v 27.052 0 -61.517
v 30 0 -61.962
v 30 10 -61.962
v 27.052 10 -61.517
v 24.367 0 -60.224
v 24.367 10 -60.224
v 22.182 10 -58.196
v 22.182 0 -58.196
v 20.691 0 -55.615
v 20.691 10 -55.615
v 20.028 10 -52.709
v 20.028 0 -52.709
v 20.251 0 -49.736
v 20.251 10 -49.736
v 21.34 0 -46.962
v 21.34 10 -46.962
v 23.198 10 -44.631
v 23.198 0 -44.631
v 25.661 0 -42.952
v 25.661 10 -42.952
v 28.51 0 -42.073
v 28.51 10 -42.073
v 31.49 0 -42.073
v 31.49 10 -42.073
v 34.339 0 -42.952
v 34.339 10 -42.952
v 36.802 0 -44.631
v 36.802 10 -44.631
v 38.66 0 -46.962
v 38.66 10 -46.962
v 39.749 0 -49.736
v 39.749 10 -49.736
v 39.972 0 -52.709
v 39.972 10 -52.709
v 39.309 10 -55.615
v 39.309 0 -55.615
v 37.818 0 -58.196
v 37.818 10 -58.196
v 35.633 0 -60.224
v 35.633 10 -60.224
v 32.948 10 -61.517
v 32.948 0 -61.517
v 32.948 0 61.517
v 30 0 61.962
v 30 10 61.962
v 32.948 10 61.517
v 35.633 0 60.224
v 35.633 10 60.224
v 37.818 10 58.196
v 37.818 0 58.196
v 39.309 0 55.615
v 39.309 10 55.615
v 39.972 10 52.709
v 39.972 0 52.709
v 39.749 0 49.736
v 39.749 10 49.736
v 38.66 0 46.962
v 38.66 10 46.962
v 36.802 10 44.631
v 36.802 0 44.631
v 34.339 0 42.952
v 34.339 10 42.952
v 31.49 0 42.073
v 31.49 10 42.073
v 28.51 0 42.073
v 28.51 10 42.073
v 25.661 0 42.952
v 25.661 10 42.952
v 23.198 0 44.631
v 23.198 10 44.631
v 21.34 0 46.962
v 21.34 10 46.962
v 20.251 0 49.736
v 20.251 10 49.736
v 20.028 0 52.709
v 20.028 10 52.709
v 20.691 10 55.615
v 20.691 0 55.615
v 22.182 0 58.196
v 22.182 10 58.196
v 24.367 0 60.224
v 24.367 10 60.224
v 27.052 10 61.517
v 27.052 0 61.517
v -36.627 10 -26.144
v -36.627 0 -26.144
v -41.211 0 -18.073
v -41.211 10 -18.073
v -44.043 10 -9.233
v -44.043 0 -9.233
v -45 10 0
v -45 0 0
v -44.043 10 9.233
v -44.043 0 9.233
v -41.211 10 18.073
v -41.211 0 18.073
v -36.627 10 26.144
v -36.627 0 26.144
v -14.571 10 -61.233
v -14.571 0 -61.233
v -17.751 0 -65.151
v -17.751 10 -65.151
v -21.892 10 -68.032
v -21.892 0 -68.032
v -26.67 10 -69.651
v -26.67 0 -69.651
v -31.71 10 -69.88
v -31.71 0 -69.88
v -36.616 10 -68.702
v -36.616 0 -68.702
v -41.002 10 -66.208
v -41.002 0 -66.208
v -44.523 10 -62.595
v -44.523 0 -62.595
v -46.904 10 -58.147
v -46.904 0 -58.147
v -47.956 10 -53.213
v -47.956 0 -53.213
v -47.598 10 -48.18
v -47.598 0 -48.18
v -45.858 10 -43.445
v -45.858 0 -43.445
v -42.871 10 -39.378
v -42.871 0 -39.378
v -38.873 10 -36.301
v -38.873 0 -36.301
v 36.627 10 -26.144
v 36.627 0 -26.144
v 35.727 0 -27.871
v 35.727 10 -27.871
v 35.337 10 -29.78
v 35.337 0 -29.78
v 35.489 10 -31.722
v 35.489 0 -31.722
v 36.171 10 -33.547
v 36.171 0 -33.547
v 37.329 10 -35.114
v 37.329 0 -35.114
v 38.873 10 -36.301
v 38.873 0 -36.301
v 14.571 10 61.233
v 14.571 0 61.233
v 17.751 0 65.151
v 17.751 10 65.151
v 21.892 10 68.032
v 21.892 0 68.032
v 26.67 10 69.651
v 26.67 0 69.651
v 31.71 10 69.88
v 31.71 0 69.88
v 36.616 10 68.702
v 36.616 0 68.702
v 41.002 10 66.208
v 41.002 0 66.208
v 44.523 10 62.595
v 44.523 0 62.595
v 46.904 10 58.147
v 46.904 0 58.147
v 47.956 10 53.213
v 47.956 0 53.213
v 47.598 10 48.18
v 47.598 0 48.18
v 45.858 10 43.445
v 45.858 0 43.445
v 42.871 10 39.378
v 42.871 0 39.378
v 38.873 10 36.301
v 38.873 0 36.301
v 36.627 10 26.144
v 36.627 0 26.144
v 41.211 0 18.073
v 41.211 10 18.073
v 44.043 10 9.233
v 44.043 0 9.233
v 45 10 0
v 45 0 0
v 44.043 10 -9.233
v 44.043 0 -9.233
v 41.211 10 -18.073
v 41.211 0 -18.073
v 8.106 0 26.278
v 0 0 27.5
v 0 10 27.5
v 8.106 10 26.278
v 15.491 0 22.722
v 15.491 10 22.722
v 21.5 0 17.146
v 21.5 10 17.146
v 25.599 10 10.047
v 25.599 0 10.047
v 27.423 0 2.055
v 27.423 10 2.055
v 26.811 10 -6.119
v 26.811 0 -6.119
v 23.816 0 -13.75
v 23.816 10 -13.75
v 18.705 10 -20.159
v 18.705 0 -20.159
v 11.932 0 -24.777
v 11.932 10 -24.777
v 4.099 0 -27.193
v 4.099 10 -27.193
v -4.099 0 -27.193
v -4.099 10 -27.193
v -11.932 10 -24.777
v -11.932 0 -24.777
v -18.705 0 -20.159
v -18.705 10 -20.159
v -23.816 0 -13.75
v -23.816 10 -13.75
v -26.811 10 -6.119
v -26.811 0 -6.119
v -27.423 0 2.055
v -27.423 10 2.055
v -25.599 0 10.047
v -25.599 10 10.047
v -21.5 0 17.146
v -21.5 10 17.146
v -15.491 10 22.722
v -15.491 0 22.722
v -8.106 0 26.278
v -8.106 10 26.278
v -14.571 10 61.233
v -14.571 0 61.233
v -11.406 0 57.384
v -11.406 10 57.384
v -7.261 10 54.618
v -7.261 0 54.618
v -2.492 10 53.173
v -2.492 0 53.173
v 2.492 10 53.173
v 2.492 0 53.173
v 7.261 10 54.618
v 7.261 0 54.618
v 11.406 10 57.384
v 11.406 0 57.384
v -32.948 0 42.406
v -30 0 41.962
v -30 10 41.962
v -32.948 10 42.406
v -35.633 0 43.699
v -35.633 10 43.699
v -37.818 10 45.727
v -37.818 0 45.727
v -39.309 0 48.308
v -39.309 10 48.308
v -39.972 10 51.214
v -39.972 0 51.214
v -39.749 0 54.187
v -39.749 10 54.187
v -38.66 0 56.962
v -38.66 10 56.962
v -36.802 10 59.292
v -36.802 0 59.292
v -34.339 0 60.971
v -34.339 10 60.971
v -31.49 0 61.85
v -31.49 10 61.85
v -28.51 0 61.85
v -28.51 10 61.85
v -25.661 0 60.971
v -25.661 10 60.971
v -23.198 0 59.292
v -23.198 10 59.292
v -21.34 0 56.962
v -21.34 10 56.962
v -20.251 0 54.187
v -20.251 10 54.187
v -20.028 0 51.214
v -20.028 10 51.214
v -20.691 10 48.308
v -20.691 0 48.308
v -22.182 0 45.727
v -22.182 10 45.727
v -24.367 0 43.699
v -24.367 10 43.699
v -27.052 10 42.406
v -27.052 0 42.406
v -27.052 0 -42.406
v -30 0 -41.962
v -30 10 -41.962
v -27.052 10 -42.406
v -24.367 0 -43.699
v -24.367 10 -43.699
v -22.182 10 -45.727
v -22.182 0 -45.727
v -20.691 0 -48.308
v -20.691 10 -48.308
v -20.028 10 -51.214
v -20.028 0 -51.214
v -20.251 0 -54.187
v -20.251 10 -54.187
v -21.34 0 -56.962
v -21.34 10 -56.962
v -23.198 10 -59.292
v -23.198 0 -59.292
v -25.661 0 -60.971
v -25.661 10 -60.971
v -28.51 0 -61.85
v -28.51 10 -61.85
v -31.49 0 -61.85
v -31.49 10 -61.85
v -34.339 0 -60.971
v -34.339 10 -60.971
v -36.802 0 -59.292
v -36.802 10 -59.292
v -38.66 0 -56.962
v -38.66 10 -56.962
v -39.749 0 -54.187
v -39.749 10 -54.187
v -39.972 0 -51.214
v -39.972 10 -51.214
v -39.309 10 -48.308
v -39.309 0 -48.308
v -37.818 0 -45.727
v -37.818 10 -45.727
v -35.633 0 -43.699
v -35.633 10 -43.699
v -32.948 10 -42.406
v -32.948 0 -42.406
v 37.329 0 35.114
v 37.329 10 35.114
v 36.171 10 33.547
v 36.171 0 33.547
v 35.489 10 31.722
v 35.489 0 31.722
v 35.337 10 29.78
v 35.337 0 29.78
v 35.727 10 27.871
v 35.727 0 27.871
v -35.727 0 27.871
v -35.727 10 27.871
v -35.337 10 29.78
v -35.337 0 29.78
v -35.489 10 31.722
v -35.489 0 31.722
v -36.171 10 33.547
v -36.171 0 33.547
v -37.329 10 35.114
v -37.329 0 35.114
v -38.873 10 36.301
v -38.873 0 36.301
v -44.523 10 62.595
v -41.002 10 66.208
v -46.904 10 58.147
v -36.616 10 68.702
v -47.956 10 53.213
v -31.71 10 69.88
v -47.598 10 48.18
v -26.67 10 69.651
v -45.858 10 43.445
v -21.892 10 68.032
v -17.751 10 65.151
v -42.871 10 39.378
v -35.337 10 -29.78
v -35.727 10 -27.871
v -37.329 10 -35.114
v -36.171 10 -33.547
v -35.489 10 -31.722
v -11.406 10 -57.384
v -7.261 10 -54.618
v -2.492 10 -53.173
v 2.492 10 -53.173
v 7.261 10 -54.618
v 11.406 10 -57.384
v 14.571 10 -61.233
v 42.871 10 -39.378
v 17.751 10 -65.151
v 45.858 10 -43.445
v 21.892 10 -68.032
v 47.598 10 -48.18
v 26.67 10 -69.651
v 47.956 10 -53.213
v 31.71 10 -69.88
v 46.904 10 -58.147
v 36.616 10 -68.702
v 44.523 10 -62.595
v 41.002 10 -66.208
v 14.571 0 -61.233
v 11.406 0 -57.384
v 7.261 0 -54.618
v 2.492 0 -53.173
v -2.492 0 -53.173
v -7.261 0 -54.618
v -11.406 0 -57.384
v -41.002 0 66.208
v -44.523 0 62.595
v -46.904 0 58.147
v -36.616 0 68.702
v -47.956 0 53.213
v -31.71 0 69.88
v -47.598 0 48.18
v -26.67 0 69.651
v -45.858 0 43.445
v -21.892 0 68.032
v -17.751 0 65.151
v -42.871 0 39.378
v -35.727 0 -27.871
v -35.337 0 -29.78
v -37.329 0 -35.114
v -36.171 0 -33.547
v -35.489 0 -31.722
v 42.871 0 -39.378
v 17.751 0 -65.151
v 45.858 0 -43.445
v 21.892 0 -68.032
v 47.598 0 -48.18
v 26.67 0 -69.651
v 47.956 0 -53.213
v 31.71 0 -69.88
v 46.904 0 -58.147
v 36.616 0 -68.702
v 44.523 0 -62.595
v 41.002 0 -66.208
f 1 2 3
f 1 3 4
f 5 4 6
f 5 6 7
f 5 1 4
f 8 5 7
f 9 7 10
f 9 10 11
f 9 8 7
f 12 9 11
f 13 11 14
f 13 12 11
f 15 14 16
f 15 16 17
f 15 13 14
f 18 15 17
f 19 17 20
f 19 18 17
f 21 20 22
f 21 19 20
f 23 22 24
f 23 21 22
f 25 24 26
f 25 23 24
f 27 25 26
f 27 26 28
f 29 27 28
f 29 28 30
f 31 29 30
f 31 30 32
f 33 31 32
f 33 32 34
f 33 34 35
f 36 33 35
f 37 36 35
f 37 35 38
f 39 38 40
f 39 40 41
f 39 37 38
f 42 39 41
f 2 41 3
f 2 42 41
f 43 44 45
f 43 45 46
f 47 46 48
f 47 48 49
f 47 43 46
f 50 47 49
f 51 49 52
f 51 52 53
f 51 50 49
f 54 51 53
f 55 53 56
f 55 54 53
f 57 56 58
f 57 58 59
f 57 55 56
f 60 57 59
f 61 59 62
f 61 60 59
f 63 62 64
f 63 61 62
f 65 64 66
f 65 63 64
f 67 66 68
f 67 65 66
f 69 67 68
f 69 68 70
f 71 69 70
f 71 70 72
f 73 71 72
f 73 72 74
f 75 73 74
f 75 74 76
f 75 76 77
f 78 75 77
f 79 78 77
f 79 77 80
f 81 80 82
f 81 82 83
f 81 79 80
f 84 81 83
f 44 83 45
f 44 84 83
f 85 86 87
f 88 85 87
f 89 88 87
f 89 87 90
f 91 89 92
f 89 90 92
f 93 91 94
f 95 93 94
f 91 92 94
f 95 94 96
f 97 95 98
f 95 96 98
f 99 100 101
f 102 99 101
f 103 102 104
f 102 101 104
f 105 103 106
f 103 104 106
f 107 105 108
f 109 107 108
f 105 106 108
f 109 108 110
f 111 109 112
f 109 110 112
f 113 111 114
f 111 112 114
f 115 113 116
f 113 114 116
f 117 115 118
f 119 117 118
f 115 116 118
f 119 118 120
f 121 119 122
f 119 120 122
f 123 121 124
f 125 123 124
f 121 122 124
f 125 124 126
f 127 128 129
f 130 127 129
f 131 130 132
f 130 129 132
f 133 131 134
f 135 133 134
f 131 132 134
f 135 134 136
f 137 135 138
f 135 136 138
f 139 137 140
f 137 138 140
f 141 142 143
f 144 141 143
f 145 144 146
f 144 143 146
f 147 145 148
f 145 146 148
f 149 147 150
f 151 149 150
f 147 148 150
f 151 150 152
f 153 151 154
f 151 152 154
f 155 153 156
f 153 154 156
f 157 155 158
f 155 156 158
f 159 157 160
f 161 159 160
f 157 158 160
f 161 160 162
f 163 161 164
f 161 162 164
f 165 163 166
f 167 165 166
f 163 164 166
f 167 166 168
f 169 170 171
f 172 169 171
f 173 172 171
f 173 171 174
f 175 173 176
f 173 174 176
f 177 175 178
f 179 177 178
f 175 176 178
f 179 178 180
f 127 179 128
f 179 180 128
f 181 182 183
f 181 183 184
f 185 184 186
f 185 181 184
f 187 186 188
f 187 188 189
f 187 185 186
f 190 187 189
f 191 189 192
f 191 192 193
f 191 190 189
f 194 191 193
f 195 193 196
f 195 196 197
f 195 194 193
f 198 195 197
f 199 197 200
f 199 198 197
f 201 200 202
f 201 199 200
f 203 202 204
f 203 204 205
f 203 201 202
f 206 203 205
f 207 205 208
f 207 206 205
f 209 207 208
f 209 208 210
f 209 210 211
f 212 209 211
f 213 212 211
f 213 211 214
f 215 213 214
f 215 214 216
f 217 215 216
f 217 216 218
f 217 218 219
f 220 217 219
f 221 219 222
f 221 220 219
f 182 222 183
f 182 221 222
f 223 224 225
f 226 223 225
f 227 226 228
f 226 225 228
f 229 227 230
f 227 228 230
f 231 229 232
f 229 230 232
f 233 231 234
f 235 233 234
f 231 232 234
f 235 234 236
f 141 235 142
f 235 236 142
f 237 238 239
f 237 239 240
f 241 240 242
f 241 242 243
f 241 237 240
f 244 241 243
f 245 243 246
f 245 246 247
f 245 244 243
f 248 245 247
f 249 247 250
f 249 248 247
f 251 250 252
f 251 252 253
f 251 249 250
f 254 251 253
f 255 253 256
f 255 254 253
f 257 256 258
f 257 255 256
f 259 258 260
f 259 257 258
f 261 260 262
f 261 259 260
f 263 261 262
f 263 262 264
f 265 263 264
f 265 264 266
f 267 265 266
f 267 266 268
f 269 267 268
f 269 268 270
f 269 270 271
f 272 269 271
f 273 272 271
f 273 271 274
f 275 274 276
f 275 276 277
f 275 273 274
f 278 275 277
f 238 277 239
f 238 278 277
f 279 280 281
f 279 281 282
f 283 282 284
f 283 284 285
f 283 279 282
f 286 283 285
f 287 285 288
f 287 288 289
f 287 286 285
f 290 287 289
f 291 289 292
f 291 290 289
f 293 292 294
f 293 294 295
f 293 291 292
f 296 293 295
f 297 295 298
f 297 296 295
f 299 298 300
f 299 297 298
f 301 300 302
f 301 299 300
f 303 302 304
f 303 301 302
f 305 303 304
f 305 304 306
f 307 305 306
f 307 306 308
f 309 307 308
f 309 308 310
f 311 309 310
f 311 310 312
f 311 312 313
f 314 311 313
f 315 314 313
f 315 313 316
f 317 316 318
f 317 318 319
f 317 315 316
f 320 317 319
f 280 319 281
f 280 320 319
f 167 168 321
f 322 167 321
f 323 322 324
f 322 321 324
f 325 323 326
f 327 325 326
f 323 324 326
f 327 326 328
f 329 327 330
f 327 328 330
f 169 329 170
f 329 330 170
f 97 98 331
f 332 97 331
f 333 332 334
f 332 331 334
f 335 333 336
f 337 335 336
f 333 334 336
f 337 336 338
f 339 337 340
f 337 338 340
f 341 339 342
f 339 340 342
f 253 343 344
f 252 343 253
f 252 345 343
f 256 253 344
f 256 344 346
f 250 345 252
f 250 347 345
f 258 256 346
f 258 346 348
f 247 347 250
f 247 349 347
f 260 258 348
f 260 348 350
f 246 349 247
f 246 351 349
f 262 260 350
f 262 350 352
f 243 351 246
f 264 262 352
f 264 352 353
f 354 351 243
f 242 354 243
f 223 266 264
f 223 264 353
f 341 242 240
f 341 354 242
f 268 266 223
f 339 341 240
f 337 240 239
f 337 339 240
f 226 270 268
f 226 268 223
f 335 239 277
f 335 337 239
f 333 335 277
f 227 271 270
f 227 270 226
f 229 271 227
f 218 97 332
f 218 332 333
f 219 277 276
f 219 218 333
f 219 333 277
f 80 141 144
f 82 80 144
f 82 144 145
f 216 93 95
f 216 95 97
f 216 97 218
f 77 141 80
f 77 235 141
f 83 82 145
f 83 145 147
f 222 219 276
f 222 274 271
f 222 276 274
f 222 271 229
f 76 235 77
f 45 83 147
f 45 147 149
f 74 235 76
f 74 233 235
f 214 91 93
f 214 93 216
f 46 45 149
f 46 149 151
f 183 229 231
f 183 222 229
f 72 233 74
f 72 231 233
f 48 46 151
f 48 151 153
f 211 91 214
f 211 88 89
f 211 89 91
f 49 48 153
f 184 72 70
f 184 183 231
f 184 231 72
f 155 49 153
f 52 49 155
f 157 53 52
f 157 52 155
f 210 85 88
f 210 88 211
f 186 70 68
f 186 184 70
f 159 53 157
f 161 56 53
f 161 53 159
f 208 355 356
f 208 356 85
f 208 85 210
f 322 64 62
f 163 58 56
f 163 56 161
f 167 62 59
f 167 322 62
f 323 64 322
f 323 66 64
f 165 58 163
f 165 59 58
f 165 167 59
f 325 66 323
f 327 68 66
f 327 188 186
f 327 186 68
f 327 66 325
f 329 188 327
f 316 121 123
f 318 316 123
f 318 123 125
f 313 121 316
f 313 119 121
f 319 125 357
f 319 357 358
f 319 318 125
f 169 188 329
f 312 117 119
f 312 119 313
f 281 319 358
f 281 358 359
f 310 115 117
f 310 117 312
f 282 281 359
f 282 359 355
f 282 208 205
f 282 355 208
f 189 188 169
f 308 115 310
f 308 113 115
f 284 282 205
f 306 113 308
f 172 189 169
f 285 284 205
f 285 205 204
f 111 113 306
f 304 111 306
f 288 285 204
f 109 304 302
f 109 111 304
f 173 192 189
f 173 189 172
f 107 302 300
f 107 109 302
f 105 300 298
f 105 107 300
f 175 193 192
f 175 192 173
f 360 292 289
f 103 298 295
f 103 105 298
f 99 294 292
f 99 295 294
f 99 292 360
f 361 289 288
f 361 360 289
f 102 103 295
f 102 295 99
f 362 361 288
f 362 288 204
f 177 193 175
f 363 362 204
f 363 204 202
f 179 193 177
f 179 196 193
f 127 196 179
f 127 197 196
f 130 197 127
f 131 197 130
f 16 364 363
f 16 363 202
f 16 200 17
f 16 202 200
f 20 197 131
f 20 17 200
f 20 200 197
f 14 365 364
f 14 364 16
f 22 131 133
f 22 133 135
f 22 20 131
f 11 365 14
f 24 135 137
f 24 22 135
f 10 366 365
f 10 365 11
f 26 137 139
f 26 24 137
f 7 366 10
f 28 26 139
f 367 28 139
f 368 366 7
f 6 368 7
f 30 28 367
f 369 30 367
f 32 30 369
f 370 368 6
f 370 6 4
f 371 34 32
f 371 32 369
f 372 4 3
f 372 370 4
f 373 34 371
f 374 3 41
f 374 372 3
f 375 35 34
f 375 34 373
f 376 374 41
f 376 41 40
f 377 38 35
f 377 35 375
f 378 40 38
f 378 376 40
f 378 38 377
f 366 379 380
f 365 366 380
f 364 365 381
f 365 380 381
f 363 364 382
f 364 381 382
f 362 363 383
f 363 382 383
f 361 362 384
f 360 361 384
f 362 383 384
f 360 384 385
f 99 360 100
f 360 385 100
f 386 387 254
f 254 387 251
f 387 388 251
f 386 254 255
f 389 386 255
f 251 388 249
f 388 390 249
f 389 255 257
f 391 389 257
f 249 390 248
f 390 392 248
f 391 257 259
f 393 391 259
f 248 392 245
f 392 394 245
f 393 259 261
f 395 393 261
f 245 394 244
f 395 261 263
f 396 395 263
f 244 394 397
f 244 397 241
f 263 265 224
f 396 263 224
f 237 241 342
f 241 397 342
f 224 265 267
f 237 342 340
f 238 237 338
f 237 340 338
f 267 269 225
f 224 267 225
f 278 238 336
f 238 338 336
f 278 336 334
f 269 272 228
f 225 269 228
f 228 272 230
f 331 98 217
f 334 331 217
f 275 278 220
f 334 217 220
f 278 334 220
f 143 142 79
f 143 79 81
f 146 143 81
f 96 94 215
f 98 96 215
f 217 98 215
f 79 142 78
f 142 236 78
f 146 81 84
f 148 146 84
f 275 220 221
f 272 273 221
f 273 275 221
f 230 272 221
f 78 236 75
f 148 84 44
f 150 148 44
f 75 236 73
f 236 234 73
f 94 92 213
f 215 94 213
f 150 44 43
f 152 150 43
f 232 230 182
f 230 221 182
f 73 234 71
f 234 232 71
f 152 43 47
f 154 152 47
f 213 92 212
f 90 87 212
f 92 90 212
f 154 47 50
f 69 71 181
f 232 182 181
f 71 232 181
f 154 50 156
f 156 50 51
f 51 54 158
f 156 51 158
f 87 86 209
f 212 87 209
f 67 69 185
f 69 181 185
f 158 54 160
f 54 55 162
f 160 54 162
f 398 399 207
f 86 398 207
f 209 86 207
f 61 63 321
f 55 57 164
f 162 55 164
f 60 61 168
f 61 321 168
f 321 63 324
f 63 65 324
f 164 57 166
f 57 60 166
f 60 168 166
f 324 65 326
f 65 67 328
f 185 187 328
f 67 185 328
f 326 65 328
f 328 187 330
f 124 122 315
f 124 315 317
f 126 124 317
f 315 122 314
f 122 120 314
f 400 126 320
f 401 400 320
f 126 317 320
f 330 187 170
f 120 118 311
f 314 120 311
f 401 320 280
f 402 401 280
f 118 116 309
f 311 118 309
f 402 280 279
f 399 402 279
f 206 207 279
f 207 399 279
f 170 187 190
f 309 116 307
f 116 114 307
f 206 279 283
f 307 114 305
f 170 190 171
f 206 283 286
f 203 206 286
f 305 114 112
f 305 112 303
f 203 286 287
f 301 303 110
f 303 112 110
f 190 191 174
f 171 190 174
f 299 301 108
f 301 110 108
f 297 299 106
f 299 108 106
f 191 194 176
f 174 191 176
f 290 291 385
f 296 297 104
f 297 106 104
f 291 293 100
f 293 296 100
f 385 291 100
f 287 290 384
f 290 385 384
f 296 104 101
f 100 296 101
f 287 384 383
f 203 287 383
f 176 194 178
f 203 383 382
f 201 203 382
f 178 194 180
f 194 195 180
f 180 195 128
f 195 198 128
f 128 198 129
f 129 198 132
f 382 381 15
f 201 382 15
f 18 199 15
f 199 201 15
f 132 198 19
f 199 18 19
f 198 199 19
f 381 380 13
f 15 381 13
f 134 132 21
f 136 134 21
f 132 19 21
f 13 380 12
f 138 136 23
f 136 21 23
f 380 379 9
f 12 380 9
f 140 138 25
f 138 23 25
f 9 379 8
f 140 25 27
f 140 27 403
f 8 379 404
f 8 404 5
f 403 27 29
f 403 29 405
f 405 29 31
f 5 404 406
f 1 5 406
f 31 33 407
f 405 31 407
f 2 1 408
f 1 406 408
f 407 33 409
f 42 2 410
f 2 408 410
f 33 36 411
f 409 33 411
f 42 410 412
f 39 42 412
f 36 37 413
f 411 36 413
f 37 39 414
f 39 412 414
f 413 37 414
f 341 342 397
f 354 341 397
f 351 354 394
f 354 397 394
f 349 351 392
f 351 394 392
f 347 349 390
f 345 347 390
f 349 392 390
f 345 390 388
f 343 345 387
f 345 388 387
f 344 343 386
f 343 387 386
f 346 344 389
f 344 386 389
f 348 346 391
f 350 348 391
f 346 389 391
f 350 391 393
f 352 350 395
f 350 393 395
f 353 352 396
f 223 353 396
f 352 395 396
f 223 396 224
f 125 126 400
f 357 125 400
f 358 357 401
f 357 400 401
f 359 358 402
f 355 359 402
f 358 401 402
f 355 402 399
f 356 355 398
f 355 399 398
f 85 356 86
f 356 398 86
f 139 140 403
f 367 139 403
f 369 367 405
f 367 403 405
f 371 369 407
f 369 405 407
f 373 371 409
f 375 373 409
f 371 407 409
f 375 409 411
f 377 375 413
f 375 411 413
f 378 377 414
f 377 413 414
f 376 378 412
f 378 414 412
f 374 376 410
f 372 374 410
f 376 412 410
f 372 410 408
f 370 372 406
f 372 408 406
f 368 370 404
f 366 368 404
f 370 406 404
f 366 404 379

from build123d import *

# Parameters (mm, degrees)
SKETCH_1_R      = 27.5
SKETCH_1_R_2    = 10
EXTRUDE_1_DEPTH = 10


with BuildPart() as part:
    # Эскиз1 → Бобышка-Вытянуть1 (new body)
    with BuildSketch(Plane(origin=(0, 0, 0), x_dir=(1, 0, 0), z_dir=(0, 1, 0))):
        with BuildLine():
            ThreePointArc((36.626693786, -26.14355183), (45, 0), (36.626693786, 26.14355183))
            ThreePointArc((36.626693786, 26.14355183), (35.489388485, 31.722157226), (38.87340923, 36.300661906))
            ThreePointArc((38.87340923, 36.300661906), (42.889809267, 64.52547333), (14.571428571, 61.232941793))
            ThreePointArc((14.571428571, 61.232941793), (0, 52.989280604), (-14.571428571, 61.232941793))
            ThreePointArc((-14.571428571, 61.232941793), (-42.889809267, 64.52547333), (-38.87340923, 36.300661906))
            ThreePointArc((-38.87340923, 36.300661906), (-35.489388485, 31.722157226), (-36.626693786, 26.14355183))
            ThreePointArc((-36.626693786, 26.14355183), (-45, 0), (-36.626693786, -26.14355183))
            ThreePointArc((-36.626693786, -26.14355183), (-35.489388485, -31.722157226), (-38.87340923, -36.300661906))
            ThreePointArc((-38.87340923, -36.300661906), (-42.889809267, -64.52547333), (-14.571428571, -61.232941793))
            ThreePointArc((-14.571428571, -61.232941793), (0, -52.989280604), (14.571428571, -61.232941793))
            ThreePointArc((14.571428571, -61.232941793), (42.889809267, -64.52547333), (38.87340923, -36.300661906))
            ThreePointArc((38.87340923, -36.300661906), (35.489388485, -31.722157226), (36.626693786, -26.14355183))
        make_face()
        Circle(SKETCH_1_R, mode=Mode.SUBTRACT)
        with Locations((30, -51.961524227)):
            Circle(SKETCH_1_R_2, mode=Mode.SUBTRACT)
        with Locations((-30, -51.961524227)):
            Circle(SKETCH_1_R_2, mode=Mode.SUBTRACT)
        with Locations((-30, 51.961524227)):
            Circle(SKETCH_1_R_2, mode=Mode.SUBTRACT)
        with Locations((30, 51.961524227)):
            Circle(SKETCH_1_R_2, mode=Mode.SUBTRACT)
    extrude(amount=EXTRUDE_1_DEPTH)


solid = part.part
